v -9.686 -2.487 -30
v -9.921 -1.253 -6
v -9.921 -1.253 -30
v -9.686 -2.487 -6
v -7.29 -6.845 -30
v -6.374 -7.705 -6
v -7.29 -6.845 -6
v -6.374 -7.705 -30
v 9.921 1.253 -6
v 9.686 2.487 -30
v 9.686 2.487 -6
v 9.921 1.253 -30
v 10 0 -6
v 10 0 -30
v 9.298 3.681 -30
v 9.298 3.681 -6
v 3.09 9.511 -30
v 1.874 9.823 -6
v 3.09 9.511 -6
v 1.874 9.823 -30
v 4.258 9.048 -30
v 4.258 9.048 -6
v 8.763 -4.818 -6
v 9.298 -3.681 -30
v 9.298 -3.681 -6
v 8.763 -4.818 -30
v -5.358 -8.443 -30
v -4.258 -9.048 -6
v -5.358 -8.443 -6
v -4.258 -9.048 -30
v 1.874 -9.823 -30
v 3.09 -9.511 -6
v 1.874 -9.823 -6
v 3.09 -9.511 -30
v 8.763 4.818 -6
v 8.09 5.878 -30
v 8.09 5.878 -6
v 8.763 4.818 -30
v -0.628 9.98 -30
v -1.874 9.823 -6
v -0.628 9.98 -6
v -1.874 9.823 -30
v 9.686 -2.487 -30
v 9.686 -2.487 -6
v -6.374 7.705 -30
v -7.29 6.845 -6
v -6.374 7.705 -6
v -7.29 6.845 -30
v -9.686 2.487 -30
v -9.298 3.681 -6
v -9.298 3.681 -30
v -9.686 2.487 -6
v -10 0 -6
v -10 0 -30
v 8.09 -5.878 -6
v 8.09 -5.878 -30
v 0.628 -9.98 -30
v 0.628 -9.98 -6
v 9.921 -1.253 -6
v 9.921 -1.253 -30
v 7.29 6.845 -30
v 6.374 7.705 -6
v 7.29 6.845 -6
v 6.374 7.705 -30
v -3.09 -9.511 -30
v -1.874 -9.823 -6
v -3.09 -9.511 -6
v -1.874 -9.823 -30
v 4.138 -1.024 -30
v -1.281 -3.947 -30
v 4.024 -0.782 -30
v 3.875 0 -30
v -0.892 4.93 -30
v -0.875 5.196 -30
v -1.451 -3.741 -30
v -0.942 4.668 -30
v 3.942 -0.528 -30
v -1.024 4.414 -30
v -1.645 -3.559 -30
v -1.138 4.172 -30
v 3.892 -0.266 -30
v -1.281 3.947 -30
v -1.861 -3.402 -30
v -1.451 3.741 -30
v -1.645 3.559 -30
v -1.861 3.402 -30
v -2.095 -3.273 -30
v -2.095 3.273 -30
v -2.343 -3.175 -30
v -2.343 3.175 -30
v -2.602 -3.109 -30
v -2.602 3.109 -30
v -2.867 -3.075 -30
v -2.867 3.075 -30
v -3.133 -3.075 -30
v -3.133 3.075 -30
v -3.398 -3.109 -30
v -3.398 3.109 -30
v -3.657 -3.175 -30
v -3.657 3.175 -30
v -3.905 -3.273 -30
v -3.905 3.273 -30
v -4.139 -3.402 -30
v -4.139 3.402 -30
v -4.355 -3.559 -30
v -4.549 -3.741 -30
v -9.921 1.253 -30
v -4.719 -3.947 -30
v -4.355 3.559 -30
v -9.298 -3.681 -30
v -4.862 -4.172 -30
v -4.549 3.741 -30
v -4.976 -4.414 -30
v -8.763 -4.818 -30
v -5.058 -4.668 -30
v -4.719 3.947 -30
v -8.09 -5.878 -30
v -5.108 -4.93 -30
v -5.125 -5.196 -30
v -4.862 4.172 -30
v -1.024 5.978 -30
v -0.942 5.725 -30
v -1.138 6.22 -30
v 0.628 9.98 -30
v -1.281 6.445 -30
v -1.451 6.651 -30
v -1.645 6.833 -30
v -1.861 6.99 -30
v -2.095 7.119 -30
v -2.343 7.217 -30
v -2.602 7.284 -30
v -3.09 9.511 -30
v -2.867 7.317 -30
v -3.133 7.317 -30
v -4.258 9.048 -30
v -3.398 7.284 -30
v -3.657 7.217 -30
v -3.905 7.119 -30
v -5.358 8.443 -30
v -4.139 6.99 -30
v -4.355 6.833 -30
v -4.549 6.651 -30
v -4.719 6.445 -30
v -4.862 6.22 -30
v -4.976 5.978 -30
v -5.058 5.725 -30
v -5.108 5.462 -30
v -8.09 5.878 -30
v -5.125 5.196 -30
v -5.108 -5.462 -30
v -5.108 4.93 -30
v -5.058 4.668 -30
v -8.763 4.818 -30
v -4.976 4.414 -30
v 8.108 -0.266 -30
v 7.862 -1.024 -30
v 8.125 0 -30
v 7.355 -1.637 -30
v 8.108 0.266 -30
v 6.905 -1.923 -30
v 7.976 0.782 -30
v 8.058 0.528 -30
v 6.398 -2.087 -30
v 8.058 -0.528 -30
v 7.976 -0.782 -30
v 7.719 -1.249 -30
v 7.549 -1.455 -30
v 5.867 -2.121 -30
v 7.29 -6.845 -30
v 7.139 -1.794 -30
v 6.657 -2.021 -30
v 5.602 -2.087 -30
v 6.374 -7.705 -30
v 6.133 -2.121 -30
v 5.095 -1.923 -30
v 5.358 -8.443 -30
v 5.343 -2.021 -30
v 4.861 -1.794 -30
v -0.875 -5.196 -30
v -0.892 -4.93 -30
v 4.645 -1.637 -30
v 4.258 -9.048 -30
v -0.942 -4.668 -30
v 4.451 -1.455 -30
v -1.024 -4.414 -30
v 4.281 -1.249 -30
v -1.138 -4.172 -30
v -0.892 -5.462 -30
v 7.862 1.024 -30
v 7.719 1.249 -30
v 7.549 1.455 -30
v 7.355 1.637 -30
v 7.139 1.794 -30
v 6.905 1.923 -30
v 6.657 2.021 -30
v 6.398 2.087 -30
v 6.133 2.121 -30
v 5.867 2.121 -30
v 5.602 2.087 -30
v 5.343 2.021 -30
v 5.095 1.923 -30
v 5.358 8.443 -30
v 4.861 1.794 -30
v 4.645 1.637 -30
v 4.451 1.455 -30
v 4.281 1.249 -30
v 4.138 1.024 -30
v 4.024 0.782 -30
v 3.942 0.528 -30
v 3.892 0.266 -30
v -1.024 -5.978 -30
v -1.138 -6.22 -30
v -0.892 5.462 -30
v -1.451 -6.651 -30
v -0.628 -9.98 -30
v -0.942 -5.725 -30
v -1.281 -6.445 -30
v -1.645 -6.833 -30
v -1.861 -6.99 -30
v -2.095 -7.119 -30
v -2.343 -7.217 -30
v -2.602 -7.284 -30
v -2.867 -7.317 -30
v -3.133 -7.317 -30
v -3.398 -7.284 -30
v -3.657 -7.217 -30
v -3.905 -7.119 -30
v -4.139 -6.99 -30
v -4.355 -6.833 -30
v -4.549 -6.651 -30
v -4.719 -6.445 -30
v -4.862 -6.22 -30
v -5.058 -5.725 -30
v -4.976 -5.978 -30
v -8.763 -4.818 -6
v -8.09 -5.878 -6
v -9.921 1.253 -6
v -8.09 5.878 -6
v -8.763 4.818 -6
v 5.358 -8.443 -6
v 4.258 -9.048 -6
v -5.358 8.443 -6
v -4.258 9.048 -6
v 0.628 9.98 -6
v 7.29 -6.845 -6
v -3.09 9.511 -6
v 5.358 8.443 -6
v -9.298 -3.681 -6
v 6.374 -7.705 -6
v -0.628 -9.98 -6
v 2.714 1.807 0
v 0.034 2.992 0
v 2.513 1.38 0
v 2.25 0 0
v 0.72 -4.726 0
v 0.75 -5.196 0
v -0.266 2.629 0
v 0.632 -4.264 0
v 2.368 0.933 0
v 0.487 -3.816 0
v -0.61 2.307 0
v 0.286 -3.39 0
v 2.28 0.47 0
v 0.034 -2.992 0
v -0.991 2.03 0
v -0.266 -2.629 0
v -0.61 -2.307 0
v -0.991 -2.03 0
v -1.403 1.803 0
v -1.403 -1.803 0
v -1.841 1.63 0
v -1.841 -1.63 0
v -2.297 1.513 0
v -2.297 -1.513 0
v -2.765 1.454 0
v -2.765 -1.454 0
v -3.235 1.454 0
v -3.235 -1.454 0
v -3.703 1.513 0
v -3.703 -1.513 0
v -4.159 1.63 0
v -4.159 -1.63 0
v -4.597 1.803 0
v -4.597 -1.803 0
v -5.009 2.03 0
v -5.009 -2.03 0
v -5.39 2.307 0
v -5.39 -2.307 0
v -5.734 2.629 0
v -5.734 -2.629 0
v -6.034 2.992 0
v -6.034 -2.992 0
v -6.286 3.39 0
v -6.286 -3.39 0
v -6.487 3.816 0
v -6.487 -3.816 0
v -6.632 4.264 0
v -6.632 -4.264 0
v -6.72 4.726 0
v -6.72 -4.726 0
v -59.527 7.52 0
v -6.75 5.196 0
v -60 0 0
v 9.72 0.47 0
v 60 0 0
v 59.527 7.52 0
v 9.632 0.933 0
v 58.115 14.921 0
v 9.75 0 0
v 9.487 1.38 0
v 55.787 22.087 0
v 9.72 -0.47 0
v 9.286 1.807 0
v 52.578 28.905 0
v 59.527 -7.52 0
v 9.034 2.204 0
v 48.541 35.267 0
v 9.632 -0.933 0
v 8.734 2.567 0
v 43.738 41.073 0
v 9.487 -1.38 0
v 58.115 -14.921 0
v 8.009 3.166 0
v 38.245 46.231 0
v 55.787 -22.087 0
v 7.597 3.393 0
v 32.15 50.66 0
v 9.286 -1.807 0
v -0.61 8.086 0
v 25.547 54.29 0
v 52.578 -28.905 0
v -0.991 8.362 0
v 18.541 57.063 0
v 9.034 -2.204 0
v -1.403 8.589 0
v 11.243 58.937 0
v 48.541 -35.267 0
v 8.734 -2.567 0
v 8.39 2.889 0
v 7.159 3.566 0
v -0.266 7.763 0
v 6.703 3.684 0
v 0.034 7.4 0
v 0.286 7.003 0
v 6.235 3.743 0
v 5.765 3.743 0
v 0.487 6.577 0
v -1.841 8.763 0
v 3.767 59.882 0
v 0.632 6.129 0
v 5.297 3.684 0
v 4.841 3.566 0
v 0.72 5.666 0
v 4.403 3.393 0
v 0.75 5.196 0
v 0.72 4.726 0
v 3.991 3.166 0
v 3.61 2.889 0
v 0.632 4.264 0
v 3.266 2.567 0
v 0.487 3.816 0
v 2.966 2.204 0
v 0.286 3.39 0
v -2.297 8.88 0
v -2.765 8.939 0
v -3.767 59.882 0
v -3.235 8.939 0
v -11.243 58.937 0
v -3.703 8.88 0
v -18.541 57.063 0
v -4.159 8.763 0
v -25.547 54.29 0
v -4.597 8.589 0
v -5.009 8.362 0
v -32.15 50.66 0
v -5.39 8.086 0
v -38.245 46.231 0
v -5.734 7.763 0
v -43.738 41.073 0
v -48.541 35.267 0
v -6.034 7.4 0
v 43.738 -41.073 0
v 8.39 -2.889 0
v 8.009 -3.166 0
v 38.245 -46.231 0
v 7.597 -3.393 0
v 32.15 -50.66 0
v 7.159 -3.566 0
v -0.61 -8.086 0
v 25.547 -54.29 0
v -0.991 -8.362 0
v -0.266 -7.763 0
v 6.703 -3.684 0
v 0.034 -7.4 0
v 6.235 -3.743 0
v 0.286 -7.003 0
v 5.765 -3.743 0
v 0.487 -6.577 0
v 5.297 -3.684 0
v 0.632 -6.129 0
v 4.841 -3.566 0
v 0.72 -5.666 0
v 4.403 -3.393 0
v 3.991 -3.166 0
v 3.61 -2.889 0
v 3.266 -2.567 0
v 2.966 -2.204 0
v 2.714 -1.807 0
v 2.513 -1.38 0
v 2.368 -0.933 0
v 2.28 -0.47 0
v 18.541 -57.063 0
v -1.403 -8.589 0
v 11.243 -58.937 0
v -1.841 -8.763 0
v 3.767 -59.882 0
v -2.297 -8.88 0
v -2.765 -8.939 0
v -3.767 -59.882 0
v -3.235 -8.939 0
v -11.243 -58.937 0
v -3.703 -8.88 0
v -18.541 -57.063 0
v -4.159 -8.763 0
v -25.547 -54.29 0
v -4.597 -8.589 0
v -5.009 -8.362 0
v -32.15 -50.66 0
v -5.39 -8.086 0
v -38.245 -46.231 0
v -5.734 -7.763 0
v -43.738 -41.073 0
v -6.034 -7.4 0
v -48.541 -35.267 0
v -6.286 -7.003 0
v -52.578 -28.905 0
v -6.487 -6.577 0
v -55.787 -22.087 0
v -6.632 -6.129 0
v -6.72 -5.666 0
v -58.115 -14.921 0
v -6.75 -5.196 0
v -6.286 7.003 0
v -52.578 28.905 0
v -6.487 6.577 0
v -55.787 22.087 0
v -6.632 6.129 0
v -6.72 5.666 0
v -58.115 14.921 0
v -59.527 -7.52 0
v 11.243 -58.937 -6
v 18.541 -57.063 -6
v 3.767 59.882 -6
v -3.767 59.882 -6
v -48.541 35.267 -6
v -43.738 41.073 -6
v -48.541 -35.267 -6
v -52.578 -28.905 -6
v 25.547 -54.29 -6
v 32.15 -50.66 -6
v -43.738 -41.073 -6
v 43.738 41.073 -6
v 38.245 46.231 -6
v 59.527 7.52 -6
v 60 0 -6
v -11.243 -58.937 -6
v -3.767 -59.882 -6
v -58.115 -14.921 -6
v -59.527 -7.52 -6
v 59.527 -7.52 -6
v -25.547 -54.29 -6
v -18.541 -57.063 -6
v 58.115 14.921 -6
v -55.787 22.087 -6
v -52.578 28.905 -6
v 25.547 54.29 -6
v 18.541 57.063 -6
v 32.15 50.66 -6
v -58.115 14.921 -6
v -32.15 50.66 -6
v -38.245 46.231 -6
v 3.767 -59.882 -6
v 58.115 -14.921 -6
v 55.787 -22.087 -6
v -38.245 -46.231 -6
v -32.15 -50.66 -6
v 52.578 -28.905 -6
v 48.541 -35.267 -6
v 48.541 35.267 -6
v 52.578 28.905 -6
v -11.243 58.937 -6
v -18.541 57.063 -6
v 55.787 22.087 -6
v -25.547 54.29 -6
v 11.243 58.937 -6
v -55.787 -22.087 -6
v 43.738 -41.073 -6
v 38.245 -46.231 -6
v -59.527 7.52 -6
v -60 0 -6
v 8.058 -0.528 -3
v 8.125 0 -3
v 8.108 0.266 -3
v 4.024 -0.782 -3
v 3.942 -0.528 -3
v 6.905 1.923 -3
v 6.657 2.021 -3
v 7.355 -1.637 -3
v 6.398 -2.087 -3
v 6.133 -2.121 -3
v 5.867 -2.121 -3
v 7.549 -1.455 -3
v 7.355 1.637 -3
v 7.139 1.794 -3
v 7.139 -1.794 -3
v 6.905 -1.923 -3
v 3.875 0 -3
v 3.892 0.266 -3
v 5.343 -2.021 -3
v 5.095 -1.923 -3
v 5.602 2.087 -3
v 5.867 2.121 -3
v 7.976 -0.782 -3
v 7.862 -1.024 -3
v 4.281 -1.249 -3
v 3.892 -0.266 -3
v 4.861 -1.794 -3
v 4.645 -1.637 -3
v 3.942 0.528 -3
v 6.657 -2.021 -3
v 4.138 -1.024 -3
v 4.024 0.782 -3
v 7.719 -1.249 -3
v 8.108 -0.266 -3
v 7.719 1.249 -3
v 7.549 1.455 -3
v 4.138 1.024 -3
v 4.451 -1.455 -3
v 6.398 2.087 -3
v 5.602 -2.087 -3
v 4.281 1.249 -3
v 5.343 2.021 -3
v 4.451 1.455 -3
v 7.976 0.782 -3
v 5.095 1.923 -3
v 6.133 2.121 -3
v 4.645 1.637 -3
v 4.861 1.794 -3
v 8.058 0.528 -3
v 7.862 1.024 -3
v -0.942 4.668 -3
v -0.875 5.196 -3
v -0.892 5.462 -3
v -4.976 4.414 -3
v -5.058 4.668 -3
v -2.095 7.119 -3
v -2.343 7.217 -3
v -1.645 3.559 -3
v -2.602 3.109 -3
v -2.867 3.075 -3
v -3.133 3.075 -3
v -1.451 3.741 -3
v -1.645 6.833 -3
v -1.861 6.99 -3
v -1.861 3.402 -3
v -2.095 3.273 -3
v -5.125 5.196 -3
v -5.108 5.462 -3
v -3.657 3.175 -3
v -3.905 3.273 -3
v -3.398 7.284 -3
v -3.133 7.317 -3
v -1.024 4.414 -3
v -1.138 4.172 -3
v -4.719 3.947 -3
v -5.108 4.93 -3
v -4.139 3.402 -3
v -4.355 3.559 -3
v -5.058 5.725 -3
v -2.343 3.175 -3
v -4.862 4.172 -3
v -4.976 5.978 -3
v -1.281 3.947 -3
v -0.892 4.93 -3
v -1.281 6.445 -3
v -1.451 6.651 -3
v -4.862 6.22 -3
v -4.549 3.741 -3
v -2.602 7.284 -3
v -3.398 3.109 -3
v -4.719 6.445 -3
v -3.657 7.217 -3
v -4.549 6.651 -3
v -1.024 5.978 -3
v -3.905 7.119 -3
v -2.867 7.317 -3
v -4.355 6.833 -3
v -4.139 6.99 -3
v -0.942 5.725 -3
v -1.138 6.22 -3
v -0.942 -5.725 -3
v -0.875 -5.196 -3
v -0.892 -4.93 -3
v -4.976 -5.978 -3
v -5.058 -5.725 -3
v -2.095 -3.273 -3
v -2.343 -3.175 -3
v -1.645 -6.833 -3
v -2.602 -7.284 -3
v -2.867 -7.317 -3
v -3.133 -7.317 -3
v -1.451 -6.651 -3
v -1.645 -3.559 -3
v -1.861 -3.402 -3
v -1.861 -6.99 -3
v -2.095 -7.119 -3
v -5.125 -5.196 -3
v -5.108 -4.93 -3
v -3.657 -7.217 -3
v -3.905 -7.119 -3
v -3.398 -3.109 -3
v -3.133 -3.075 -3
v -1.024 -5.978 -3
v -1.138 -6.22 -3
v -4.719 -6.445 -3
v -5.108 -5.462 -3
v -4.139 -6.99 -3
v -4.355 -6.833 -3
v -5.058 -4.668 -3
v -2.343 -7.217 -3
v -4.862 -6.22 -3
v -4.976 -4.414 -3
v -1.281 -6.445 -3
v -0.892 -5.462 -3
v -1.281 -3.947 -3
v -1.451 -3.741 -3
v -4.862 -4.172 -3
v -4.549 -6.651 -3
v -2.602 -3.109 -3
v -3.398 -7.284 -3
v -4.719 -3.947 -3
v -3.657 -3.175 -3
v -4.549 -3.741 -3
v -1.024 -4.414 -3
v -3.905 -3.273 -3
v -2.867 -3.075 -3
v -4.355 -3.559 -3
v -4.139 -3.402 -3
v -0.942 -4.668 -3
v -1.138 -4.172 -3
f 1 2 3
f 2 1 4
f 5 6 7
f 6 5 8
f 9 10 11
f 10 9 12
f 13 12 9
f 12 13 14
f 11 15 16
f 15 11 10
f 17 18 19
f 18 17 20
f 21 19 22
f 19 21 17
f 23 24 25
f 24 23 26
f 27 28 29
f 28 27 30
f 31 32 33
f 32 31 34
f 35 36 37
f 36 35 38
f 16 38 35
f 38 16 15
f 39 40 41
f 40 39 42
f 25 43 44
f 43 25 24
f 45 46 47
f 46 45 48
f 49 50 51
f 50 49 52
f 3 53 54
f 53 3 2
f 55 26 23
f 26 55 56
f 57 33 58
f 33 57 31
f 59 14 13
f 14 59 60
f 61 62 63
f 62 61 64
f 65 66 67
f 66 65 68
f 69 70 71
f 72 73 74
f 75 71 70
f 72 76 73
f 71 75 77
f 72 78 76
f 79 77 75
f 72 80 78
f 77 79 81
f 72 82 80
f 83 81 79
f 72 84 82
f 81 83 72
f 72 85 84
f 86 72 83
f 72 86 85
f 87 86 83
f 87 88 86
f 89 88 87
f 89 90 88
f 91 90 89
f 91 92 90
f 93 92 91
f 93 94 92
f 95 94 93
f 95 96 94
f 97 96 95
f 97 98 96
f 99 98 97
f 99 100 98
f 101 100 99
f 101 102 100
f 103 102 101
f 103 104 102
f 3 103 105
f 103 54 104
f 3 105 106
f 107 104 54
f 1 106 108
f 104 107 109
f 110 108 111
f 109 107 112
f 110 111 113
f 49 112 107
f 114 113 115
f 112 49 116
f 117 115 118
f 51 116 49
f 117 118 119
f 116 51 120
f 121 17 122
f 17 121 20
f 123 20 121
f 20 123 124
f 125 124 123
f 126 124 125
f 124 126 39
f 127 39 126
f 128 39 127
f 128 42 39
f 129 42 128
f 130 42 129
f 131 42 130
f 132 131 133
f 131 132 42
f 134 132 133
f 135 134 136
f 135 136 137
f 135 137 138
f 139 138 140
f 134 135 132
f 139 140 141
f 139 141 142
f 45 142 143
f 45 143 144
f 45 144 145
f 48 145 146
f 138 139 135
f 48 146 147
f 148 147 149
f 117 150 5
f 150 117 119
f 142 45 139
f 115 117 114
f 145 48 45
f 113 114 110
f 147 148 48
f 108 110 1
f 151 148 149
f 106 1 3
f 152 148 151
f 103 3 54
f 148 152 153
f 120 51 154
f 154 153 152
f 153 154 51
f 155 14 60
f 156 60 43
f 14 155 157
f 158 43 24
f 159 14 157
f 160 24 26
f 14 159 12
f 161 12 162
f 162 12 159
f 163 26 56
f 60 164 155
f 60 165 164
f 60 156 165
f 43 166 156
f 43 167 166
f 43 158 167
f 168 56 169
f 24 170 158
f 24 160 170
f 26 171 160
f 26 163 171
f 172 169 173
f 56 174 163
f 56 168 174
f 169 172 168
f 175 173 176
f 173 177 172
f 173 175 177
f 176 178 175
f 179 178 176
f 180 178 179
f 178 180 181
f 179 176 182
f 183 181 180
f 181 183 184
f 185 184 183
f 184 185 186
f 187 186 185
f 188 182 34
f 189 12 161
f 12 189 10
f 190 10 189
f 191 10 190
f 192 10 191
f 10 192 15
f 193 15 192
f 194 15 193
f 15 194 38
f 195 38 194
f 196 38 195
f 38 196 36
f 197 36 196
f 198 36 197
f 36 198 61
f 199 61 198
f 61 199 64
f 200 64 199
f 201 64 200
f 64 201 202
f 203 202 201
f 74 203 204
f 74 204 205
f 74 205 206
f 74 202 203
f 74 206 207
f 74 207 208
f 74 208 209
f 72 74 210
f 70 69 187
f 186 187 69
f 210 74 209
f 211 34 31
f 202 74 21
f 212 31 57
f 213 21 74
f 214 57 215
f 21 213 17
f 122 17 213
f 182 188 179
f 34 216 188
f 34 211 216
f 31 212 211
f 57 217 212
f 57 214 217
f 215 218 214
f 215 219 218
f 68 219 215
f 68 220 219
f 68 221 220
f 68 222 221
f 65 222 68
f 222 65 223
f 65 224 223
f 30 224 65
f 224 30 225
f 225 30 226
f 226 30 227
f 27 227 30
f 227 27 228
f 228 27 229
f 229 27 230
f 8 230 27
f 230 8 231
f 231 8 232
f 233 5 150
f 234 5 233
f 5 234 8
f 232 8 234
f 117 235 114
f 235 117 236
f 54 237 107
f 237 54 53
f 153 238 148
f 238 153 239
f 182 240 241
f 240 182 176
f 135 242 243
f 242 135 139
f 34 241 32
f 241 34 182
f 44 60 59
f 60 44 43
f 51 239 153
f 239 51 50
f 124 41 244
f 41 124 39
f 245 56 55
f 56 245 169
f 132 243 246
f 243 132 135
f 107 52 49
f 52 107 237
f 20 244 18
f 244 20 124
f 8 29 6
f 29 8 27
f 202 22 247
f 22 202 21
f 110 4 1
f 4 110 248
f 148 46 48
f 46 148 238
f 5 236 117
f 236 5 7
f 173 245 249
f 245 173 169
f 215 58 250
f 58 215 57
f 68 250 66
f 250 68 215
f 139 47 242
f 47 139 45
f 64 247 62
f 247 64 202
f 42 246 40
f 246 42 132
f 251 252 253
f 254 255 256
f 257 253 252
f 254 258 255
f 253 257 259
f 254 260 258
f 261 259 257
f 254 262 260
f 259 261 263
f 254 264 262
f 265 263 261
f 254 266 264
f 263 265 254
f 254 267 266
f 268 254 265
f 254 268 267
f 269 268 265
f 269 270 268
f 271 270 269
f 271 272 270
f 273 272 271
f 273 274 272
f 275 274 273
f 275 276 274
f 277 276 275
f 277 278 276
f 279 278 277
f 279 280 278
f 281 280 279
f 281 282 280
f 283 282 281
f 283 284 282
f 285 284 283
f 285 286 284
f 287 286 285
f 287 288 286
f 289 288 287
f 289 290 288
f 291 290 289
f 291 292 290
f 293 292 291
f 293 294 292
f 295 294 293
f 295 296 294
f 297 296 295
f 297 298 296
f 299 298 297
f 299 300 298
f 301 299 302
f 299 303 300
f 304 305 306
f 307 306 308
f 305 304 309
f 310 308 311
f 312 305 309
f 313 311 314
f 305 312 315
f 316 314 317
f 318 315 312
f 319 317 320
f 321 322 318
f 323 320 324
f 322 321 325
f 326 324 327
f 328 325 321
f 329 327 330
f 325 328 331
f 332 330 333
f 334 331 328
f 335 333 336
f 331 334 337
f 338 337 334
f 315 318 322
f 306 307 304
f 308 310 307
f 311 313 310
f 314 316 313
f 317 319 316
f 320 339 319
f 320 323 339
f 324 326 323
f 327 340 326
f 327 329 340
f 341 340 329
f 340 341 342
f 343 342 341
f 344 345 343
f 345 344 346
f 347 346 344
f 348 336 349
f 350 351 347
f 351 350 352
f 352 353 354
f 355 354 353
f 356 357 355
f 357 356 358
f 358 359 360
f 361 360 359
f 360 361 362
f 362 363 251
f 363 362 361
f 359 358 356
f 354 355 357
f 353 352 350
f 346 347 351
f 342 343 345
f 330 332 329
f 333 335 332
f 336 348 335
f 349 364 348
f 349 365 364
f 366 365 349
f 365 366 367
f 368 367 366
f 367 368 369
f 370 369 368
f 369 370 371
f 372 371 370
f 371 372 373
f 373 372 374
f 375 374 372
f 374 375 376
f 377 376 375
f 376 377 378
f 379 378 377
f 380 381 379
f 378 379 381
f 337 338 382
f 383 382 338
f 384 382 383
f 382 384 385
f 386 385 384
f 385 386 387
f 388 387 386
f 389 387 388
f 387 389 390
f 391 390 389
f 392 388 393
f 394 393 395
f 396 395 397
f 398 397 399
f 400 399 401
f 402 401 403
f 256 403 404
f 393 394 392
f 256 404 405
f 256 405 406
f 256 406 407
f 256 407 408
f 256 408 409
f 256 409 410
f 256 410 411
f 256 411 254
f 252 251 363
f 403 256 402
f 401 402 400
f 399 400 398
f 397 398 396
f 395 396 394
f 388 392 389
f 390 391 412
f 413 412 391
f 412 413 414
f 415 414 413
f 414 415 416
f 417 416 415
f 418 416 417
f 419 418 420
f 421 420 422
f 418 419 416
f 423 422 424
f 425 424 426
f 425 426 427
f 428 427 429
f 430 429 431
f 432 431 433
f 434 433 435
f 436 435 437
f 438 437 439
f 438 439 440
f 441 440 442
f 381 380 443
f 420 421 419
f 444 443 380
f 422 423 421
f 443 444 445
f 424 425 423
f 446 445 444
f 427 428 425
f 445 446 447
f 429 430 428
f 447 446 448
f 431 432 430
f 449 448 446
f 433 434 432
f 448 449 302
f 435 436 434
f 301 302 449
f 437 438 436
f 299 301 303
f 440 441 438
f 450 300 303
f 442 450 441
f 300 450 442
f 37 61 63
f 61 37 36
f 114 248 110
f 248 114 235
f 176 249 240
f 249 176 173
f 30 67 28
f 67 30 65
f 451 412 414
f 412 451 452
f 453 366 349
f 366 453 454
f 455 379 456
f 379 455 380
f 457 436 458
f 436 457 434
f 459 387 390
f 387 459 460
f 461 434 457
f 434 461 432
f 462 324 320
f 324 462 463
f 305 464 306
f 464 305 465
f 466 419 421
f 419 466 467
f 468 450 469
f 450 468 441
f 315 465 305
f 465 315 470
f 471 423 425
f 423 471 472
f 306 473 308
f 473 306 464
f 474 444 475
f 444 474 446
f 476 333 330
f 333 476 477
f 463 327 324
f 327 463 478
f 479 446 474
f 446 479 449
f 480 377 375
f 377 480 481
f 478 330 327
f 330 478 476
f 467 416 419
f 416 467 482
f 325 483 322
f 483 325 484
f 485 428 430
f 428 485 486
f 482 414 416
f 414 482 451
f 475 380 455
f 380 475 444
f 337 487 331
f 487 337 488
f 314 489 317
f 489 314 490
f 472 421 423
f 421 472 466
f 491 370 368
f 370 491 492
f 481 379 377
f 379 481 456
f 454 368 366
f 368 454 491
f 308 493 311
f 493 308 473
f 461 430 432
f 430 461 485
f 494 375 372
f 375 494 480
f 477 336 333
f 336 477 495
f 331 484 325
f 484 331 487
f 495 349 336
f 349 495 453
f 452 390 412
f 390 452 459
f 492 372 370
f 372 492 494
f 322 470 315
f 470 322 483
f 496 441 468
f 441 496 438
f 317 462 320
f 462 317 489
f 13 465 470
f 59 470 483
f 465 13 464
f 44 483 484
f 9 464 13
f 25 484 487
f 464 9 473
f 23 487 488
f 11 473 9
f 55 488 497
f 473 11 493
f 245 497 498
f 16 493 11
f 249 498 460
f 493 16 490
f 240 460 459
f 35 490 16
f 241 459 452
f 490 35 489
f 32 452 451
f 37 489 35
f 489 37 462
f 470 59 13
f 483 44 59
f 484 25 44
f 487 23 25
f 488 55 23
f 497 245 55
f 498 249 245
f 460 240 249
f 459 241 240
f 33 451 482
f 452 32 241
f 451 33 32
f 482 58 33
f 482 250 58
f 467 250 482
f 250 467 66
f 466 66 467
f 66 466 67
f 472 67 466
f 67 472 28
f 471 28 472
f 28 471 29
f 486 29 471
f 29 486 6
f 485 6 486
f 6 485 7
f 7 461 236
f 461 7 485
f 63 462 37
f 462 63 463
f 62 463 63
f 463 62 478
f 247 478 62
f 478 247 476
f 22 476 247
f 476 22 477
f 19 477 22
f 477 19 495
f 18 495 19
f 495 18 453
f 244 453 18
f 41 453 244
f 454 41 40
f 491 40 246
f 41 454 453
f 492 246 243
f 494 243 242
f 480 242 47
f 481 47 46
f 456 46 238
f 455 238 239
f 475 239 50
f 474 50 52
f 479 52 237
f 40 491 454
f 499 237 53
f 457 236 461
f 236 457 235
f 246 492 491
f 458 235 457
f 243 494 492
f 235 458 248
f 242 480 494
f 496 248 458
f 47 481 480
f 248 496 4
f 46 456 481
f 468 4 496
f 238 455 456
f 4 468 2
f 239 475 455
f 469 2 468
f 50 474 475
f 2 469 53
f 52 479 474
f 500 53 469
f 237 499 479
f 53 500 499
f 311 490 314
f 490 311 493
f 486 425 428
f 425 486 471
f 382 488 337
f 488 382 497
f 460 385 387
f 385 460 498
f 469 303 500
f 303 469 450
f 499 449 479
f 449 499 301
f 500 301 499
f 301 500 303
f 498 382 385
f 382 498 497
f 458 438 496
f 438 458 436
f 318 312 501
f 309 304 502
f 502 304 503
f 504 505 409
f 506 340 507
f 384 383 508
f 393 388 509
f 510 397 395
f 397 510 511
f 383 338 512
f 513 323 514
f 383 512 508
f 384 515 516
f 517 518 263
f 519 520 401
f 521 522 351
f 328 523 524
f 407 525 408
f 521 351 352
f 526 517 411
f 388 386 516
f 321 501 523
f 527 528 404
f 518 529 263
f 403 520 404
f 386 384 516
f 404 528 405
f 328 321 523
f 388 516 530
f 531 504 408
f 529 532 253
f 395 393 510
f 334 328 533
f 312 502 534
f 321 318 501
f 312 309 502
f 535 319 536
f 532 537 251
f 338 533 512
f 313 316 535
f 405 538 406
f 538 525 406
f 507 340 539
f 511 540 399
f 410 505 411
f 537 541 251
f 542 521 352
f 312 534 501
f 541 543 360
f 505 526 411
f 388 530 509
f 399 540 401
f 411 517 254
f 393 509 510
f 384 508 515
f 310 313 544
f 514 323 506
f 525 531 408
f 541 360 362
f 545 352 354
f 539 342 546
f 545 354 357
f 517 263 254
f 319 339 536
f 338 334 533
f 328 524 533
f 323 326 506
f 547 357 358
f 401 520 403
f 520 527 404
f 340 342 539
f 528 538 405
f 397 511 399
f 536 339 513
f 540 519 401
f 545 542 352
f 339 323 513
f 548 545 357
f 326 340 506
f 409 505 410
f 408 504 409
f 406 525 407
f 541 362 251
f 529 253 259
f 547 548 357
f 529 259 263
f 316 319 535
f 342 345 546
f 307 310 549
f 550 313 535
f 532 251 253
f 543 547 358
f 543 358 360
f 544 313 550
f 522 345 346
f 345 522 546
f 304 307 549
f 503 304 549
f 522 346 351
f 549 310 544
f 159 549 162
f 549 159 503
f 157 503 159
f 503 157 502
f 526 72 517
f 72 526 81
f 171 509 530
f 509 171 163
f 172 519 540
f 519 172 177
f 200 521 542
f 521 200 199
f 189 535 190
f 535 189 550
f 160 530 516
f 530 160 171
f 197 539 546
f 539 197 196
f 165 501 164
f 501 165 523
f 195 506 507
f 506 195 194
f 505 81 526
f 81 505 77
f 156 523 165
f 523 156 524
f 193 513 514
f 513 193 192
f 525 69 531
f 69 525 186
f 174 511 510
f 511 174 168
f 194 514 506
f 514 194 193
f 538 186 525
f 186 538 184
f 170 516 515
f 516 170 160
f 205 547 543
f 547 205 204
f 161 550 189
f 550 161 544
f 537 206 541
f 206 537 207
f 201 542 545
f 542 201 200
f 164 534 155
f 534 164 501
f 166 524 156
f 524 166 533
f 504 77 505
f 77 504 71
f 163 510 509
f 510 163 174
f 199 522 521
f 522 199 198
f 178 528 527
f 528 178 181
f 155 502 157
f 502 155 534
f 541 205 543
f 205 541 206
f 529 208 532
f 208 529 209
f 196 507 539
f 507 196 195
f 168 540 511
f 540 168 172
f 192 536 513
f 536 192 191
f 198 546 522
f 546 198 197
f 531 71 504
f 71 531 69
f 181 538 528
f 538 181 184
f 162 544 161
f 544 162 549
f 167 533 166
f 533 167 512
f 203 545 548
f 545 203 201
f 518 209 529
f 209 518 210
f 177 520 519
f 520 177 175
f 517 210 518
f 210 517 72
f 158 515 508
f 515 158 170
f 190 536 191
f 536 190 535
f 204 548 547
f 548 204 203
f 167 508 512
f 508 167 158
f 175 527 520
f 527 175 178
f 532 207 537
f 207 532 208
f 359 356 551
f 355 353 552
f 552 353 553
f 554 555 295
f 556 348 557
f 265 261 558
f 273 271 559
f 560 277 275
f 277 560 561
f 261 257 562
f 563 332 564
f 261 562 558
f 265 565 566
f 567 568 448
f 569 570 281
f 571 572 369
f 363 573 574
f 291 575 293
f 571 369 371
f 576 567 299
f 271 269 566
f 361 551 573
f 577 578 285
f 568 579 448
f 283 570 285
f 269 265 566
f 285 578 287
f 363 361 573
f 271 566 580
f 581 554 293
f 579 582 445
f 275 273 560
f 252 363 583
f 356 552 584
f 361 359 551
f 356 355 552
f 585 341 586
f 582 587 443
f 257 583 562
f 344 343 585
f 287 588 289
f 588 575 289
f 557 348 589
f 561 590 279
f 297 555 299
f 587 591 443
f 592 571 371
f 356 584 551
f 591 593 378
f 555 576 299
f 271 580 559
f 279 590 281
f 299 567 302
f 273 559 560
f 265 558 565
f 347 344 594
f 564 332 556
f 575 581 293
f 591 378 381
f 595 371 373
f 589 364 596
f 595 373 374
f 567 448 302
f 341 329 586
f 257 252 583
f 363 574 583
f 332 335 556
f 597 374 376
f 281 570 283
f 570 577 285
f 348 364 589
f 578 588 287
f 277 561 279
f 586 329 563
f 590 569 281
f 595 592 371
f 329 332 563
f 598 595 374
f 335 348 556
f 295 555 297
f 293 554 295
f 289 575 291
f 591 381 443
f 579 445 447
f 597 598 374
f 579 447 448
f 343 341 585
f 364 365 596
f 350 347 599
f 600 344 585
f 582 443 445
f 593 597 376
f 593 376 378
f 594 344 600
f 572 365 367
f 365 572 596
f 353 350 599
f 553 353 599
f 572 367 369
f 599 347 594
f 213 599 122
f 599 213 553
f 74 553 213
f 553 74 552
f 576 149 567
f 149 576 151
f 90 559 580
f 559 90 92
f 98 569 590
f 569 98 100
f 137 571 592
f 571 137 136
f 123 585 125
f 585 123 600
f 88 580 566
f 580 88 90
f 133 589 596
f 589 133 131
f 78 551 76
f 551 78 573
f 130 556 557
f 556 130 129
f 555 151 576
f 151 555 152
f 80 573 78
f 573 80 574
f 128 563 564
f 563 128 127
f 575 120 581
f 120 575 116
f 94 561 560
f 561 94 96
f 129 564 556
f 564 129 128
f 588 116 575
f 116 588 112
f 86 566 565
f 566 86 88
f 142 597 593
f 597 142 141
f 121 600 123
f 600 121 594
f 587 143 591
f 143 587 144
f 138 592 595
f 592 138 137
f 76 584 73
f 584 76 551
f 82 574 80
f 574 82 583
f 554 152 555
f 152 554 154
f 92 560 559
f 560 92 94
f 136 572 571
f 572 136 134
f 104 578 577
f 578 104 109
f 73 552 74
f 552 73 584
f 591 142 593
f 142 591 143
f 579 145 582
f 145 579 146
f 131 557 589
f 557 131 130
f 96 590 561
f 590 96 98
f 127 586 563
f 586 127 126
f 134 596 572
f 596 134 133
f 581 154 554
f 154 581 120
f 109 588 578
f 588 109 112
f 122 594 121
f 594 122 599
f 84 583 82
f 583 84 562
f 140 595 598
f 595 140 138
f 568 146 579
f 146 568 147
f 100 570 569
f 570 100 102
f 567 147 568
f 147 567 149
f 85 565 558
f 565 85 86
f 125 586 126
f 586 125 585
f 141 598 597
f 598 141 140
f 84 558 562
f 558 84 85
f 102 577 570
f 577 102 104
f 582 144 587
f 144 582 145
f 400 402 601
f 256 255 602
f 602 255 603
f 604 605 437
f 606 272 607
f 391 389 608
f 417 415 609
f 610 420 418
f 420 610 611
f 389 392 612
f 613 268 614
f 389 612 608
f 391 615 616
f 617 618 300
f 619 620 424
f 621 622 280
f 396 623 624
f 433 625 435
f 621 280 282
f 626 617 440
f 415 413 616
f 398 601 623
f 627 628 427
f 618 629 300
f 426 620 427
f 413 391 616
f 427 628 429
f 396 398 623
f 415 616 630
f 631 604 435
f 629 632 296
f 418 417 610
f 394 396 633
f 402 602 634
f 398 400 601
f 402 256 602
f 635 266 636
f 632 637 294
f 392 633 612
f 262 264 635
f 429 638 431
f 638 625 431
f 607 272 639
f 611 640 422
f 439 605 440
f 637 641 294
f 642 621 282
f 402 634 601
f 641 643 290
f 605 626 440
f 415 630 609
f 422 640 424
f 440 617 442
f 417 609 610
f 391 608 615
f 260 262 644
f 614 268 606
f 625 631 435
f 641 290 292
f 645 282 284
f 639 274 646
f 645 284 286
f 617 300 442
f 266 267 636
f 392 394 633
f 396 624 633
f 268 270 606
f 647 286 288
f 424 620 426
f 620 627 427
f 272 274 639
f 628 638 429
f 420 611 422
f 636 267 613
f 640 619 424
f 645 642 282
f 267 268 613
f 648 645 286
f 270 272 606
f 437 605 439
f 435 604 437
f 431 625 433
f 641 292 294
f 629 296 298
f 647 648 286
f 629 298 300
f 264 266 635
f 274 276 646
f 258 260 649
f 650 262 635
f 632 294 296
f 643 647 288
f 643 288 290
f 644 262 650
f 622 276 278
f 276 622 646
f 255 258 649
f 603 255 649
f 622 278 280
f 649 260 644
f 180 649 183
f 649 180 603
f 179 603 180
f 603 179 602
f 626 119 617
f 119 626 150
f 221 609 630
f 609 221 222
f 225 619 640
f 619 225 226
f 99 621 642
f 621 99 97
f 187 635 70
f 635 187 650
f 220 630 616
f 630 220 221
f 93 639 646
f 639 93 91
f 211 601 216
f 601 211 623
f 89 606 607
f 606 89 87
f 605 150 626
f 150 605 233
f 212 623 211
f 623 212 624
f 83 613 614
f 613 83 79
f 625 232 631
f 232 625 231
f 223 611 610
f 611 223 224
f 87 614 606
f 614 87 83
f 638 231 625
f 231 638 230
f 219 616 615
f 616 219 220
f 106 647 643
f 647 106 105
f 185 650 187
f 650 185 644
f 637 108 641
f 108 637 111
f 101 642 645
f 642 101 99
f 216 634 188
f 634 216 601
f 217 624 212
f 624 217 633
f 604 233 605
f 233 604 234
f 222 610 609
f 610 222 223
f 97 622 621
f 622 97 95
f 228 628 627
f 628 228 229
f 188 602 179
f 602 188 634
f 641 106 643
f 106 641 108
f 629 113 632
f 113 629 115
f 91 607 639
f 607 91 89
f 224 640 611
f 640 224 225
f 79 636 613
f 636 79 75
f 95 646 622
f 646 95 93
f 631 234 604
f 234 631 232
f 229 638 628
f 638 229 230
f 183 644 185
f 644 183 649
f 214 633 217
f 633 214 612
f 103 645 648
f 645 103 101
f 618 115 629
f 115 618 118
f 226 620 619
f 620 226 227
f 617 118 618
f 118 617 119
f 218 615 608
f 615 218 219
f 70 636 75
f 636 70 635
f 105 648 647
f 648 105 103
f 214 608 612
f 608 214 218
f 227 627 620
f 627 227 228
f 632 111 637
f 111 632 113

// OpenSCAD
$fn = 50;


difference() {
	union() {
		translate(v = [0, 0, -30.0000000000]) {
			cylinder(h = 30, r = 10.0000000000);
		}
		translate(v = [0, 0, -6.0000000000]) {
			cylinder(h = 6, r = 60.0000000000);
		}
	}
	union() {
		translate(v = [6.0000000000, 0.0000000000, 0]) {
			rotate(a = [0, 0, 0]) {
				difference() {
					union() {
						#translate(v = [0, 0, -30.0000000000]) {
							cylinder(h = 30, r = 2.0000000000);
						}
						#translate(v = [0, 0, -3]) {
							cylinder(h = 3, r = 10.0000000000, r1 = 2.1250000000, r2 = 3.7500000000);
						}
						#translate(v = [0, 0, -30.0000000000]) {
							cylinder(h = 30, r = 2.1250000000);
						}
						#translate(v = [0, 0, -30.0000000000]) {
							cylinder(h = 30, r = 2.0000000000);
						}
					}
					union();
				}
			}
		}
		translate(v = [-3.0000000000, 5.1961524227, 0]) {
			rotate(a = [0, 0, 0]) {
				difference() {
					union() {
						#translate(v = [0, 0, -30.0000000000]) {
							cylinder(h = 30, r = 2.0000000000);
						}
						#translate(v = [0, 0, -3]) {
							cylinder(h = 3, r = 10.0000000000, r1 = 2.1250000000, r2 = 3.7500000000);
						}
						#translate(v = [0, 0, -30.0000000000]) {
							cylinder(h = 30, r = 2.1250000000);
						}
						#translate(v = [0, 0, -30.0000000000]) {
							cylinder(h = 30, r = 2.0000000000);
						}
					}
					union();
				}
			}
		}
		translate(v = [-3.0000000000, -5.1961524227, 0]) {
			rotate(a = [0, 0, 0]) {
				difference() {
					union() {
						#translate(v = [0, 0, -30.0000000000]) {
							cylinder(h = 30, r = 2.0000000000);
						}
						#translate(v = [0, 0, -3]) {
							cylinder(h = 3, r = 10.0000000000, r1 = 2.1250000000, r2 = 3.7500000000);
						}
						#translate(v = [0, 0, -30.0000000000]) {
							cylinder(h = 30, r = 2.1250000000);
						}
						#translate(v = [0, 0, -30.0000000000]) {
							cylinder(h = 30, r = 2.0000000000);
						}
					}
					union();
				}
			}
		}
	}
}
